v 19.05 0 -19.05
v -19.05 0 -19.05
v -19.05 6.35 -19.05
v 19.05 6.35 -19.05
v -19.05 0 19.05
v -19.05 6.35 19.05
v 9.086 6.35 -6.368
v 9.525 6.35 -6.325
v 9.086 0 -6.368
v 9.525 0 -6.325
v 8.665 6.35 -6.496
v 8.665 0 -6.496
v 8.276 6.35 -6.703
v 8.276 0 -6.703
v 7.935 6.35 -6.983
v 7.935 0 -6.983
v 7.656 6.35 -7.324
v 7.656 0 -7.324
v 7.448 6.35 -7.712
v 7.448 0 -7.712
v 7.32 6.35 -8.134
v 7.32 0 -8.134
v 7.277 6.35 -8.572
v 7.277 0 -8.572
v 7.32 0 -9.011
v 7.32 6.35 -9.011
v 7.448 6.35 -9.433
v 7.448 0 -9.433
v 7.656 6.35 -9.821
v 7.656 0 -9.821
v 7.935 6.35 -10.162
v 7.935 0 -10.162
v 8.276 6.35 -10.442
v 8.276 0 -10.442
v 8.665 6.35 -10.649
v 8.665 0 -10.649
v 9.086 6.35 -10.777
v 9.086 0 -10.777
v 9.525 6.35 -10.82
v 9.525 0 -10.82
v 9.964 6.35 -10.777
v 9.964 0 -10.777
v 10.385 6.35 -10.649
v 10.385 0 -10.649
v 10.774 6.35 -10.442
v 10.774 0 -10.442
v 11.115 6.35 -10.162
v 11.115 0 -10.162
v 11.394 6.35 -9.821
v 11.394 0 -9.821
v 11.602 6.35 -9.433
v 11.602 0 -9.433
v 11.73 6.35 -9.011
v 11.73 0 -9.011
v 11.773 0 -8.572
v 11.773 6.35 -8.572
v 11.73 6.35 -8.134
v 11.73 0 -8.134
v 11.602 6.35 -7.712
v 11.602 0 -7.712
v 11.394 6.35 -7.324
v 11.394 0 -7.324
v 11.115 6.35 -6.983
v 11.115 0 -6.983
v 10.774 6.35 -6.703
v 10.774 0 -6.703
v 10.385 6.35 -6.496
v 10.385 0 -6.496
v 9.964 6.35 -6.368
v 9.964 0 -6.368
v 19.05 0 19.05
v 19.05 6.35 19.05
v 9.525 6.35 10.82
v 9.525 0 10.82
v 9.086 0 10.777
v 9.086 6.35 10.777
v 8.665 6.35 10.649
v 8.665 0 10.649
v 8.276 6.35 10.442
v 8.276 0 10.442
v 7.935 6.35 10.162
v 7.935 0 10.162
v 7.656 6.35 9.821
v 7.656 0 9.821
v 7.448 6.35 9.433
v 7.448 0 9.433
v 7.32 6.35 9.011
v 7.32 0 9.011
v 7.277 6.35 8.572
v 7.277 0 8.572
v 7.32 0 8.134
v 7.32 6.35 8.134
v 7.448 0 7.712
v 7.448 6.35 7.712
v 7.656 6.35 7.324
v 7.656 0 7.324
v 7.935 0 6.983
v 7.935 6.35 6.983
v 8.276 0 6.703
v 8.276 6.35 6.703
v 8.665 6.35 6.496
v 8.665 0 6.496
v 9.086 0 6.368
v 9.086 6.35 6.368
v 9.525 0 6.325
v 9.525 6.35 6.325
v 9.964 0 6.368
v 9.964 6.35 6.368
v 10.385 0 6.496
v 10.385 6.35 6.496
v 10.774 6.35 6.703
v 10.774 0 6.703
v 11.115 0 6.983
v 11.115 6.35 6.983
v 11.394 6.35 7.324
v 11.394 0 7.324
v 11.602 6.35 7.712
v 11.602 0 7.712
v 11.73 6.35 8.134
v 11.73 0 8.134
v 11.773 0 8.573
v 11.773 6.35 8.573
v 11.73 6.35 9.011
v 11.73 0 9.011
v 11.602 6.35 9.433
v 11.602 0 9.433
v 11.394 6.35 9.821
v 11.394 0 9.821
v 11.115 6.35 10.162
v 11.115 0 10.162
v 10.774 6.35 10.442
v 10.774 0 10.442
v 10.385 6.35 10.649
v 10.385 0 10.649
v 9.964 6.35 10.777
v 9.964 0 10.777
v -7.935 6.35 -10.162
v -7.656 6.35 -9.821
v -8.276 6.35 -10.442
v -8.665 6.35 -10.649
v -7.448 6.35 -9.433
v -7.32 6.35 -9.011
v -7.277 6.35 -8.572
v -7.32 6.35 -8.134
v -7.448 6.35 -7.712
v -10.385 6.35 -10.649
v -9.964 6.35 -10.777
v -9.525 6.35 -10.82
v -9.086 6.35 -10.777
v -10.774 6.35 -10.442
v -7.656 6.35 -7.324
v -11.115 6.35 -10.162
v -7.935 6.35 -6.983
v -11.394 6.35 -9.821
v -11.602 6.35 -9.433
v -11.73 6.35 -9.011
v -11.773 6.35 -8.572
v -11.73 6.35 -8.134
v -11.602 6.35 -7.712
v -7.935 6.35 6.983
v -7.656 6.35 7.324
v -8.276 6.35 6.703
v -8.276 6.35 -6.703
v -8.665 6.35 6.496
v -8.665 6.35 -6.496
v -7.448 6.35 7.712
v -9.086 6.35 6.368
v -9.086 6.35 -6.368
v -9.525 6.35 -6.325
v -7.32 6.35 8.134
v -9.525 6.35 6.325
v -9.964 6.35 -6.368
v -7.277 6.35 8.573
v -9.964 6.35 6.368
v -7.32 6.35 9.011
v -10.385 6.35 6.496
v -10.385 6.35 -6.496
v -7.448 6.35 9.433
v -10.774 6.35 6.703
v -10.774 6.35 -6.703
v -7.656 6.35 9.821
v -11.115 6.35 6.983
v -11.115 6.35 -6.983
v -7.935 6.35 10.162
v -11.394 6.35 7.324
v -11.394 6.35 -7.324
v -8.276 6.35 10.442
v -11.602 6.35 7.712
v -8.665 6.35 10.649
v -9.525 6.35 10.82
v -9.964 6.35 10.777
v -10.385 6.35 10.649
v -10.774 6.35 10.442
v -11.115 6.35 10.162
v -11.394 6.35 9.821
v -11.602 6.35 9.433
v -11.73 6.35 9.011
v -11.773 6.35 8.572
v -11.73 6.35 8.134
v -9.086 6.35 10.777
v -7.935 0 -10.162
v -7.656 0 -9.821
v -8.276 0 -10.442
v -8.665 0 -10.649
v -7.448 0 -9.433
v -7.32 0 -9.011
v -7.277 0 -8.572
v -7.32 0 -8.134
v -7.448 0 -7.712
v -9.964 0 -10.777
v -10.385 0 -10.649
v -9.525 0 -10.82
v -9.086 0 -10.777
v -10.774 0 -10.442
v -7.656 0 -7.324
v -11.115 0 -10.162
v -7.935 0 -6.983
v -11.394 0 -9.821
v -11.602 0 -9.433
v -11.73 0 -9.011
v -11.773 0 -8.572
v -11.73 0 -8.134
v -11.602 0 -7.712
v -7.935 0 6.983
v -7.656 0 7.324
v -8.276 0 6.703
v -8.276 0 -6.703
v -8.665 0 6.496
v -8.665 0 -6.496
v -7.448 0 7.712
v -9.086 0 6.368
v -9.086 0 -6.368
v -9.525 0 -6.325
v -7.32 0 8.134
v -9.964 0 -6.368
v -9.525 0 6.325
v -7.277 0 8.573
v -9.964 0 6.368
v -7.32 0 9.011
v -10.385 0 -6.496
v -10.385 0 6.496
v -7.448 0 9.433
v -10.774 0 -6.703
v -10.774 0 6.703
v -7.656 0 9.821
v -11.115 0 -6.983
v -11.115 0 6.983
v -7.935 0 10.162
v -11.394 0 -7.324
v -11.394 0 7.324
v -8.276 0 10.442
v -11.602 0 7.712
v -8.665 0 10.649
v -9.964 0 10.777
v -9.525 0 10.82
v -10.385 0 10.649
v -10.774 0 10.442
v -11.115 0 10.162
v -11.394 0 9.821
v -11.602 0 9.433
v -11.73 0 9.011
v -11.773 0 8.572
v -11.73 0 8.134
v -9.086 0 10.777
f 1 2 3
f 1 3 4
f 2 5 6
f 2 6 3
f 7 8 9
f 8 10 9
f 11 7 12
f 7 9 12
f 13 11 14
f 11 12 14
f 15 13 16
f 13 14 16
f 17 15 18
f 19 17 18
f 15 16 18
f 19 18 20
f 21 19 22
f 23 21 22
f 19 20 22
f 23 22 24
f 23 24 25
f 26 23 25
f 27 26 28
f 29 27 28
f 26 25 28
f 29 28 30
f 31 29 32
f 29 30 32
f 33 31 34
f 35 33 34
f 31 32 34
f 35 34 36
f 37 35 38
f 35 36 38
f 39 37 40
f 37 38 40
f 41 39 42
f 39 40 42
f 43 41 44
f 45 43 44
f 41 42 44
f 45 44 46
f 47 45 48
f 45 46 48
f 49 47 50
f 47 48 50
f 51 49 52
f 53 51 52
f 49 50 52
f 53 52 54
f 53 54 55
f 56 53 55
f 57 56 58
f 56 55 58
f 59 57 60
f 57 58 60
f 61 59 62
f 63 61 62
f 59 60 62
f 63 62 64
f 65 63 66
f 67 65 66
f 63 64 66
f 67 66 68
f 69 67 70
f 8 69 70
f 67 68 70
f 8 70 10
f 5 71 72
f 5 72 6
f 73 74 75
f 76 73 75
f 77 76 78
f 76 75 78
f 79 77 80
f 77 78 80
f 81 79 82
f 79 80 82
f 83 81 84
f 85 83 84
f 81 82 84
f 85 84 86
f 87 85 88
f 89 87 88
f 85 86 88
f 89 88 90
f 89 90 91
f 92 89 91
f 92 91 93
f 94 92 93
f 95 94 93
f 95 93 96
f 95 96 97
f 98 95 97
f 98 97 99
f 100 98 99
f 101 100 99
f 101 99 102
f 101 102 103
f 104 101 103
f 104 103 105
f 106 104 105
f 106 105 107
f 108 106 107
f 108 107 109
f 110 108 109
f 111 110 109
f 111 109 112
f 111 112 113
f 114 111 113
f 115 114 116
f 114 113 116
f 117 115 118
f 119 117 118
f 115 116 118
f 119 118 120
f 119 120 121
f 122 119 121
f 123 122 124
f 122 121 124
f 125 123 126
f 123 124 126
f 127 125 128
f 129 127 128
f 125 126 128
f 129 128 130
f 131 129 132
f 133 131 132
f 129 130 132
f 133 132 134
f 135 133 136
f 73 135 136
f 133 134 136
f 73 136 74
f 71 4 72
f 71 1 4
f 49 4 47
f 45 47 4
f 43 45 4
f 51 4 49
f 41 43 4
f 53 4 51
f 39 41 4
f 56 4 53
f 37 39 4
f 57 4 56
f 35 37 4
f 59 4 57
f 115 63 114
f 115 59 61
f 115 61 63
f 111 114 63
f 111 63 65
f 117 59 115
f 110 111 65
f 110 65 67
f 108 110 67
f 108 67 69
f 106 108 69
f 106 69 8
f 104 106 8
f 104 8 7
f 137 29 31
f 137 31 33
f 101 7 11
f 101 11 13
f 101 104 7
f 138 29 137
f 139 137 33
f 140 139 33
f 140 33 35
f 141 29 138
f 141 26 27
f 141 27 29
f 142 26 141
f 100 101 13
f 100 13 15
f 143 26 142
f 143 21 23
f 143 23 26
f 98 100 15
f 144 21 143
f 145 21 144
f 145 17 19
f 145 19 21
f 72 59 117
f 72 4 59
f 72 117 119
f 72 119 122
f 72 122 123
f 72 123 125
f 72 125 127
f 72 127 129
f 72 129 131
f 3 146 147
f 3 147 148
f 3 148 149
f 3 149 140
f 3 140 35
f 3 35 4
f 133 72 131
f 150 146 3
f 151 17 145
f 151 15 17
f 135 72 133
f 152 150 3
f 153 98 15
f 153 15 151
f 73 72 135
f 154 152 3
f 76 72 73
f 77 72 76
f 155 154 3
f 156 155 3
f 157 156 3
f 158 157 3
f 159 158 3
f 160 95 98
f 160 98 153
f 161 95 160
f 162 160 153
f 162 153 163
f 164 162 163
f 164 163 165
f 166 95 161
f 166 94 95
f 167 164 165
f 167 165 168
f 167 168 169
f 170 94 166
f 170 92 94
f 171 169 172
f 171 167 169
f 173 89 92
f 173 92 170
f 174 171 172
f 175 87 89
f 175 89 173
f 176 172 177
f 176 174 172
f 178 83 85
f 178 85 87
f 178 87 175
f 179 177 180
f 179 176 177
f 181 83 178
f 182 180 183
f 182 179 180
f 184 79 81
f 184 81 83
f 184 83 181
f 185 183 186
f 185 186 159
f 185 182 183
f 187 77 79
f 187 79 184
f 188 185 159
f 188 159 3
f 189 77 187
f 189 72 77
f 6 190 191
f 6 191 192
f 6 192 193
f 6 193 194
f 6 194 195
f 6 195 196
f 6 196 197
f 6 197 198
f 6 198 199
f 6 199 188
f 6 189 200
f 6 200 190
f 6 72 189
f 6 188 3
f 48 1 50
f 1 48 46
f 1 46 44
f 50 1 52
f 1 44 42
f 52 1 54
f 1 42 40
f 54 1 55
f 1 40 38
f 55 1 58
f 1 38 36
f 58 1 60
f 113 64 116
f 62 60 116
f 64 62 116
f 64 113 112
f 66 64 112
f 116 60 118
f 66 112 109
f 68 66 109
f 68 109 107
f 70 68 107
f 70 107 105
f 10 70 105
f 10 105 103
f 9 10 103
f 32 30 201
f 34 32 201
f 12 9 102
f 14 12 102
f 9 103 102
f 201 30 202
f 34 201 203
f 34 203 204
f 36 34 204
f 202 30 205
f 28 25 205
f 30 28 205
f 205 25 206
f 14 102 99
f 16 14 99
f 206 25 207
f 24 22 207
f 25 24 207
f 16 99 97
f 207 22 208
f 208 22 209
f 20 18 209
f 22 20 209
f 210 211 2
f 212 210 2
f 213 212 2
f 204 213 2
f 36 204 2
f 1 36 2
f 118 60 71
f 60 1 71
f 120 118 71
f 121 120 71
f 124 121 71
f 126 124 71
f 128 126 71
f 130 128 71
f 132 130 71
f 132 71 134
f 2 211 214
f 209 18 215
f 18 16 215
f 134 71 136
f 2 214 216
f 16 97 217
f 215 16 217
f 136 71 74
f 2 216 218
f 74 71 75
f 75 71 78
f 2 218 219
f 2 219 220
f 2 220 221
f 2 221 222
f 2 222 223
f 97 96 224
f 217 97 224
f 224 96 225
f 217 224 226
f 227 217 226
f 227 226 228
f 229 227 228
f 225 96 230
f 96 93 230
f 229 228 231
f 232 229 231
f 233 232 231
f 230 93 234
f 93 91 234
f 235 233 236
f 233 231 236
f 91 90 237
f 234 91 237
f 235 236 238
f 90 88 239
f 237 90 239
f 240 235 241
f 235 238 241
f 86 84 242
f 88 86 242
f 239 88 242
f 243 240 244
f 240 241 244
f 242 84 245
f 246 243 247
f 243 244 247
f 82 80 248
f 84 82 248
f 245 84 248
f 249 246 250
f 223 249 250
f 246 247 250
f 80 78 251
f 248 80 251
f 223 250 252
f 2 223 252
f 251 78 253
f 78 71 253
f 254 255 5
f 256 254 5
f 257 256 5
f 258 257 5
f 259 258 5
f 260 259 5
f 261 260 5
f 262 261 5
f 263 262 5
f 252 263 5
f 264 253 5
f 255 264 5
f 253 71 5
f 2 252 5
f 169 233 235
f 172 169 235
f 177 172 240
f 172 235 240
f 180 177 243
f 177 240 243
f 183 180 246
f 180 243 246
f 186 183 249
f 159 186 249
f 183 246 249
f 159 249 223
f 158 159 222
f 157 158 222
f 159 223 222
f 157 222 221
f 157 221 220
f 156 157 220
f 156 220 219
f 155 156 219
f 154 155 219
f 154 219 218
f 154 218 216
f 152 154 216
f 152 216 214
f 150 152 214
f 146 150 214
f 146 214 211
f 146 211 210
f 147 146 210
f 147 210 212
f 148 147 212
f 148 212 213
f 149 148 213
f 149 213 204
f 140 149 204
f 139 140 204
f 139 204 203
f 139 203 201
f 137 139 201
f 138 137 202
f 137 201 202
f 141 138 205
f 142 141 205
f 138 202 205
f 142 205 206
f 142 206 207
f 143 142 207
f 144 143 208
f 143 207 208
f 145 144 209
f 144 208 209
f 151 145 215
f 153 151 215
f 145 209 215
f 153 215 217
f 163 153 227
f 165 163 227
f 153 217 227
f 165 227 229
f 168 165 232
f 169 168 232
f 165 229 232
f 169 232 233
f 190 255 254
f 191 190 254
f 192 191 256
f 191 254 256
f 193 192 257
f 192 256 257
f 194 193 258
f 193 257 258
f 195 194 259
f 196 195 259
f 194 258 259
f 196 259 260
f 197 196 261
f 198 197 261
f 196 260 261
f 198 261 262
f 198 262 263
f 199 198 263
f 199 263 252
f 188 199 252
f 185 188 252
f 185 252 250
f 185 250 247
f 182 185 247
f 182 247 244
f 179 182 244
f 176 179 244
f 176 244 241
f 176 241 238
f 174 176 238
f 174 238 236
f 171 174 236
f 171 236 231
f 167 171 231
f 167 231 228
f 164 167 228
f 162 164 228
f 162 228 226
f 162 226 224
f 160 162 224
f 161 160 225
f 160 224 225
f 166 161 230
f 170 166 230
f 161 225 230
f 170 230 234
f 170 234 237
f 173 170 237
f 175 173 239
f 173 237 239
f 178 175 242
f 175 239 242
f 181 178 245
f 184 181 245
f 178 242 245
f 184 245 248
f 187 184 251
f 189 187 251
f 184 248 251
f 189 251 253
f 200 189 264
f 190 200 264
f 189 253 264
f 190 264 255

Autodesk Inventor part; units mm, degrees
ref_plane "YZ Plane" through (0, 0, 0) normal (1, 0, 0) x (0, 1, 0)
ref_plane "XZ Plane" through (0, 0, 0) normal (0, 1, 0) x (-1, 0, 0)
ref_plane "XY Plane" through (0, 0, 0) normal (0, 0, 1) x (1, 0, 0)
sketch "Sketch1" plane through (0, 0, 0) normal (0, 1, 0) x (-1, 0, 0)
  line L0 (-19.05, 19.05) -> (19.05, 19.05)
  line L1 (19.05, 19.05) -> (19.05, -19.05)
  line L2 (19.05, -19.05) -> (-19.05, -19.05)
  line L3 (-19.05, -19.05) -> (-19.05, 19.05)
  line L4 (-19.05, 19.05) -> (19.05, -19.05) construction
  line L5 (19.05, 19.05) -> (-19.05, -19.05) construction
  point P0 (0, 0)
  dimension "d0" = 38.1
  dimension "d1" = 38.1
extrude "Extrusion1" add sketch "Sketch1" along normal blind 6.35
sketch "Sketch2" plane through (0, 6.35, 0) normal (0, 1, 0) x (1, 0, 0)
  line L0 (-19.05, -19.05) -> (19.05, -19.05) construction
  line L1 (19.05, -19.05) -> (19.05, 19.05) construction
  line L2 (19.05, 19.05) -> (-19.05, 19.05) construction
  line L3 (-19.05, 19.05) -> (-19.05, -19.05) construction
  point P0 (0, 0)
  point P1 (-9.525, -8.5725)
  point P2 (-9.525, 8.5725)
  point P3 (9.525, -8.5725)
  point P4 (9.525, 8.5725)
  dimension "d6" = 17.145
  dimension "d9" = 19.05
  dimension "d12" = 8.5725
  dimension "d13" = 9.525
hole "Hole1" at (-9.525, 6.35, 8.5725) at (-9.525, 6.35, -8.5725) at (9.525, 6.35, 8.5725) at (9.525, 6.35, -8.5725) direction (0, -1, 0) diameter 4.4958 end through all clearance for "Flat Head Machine Screw (82)" size "#8" standard "Ansi Unified Screw Threads"
equation "\"d12\" = 0.5 * d6"
equation "\"d13\" = 0.5 * d9"
properties part number "holestandard" material "Aluminum 6061"
